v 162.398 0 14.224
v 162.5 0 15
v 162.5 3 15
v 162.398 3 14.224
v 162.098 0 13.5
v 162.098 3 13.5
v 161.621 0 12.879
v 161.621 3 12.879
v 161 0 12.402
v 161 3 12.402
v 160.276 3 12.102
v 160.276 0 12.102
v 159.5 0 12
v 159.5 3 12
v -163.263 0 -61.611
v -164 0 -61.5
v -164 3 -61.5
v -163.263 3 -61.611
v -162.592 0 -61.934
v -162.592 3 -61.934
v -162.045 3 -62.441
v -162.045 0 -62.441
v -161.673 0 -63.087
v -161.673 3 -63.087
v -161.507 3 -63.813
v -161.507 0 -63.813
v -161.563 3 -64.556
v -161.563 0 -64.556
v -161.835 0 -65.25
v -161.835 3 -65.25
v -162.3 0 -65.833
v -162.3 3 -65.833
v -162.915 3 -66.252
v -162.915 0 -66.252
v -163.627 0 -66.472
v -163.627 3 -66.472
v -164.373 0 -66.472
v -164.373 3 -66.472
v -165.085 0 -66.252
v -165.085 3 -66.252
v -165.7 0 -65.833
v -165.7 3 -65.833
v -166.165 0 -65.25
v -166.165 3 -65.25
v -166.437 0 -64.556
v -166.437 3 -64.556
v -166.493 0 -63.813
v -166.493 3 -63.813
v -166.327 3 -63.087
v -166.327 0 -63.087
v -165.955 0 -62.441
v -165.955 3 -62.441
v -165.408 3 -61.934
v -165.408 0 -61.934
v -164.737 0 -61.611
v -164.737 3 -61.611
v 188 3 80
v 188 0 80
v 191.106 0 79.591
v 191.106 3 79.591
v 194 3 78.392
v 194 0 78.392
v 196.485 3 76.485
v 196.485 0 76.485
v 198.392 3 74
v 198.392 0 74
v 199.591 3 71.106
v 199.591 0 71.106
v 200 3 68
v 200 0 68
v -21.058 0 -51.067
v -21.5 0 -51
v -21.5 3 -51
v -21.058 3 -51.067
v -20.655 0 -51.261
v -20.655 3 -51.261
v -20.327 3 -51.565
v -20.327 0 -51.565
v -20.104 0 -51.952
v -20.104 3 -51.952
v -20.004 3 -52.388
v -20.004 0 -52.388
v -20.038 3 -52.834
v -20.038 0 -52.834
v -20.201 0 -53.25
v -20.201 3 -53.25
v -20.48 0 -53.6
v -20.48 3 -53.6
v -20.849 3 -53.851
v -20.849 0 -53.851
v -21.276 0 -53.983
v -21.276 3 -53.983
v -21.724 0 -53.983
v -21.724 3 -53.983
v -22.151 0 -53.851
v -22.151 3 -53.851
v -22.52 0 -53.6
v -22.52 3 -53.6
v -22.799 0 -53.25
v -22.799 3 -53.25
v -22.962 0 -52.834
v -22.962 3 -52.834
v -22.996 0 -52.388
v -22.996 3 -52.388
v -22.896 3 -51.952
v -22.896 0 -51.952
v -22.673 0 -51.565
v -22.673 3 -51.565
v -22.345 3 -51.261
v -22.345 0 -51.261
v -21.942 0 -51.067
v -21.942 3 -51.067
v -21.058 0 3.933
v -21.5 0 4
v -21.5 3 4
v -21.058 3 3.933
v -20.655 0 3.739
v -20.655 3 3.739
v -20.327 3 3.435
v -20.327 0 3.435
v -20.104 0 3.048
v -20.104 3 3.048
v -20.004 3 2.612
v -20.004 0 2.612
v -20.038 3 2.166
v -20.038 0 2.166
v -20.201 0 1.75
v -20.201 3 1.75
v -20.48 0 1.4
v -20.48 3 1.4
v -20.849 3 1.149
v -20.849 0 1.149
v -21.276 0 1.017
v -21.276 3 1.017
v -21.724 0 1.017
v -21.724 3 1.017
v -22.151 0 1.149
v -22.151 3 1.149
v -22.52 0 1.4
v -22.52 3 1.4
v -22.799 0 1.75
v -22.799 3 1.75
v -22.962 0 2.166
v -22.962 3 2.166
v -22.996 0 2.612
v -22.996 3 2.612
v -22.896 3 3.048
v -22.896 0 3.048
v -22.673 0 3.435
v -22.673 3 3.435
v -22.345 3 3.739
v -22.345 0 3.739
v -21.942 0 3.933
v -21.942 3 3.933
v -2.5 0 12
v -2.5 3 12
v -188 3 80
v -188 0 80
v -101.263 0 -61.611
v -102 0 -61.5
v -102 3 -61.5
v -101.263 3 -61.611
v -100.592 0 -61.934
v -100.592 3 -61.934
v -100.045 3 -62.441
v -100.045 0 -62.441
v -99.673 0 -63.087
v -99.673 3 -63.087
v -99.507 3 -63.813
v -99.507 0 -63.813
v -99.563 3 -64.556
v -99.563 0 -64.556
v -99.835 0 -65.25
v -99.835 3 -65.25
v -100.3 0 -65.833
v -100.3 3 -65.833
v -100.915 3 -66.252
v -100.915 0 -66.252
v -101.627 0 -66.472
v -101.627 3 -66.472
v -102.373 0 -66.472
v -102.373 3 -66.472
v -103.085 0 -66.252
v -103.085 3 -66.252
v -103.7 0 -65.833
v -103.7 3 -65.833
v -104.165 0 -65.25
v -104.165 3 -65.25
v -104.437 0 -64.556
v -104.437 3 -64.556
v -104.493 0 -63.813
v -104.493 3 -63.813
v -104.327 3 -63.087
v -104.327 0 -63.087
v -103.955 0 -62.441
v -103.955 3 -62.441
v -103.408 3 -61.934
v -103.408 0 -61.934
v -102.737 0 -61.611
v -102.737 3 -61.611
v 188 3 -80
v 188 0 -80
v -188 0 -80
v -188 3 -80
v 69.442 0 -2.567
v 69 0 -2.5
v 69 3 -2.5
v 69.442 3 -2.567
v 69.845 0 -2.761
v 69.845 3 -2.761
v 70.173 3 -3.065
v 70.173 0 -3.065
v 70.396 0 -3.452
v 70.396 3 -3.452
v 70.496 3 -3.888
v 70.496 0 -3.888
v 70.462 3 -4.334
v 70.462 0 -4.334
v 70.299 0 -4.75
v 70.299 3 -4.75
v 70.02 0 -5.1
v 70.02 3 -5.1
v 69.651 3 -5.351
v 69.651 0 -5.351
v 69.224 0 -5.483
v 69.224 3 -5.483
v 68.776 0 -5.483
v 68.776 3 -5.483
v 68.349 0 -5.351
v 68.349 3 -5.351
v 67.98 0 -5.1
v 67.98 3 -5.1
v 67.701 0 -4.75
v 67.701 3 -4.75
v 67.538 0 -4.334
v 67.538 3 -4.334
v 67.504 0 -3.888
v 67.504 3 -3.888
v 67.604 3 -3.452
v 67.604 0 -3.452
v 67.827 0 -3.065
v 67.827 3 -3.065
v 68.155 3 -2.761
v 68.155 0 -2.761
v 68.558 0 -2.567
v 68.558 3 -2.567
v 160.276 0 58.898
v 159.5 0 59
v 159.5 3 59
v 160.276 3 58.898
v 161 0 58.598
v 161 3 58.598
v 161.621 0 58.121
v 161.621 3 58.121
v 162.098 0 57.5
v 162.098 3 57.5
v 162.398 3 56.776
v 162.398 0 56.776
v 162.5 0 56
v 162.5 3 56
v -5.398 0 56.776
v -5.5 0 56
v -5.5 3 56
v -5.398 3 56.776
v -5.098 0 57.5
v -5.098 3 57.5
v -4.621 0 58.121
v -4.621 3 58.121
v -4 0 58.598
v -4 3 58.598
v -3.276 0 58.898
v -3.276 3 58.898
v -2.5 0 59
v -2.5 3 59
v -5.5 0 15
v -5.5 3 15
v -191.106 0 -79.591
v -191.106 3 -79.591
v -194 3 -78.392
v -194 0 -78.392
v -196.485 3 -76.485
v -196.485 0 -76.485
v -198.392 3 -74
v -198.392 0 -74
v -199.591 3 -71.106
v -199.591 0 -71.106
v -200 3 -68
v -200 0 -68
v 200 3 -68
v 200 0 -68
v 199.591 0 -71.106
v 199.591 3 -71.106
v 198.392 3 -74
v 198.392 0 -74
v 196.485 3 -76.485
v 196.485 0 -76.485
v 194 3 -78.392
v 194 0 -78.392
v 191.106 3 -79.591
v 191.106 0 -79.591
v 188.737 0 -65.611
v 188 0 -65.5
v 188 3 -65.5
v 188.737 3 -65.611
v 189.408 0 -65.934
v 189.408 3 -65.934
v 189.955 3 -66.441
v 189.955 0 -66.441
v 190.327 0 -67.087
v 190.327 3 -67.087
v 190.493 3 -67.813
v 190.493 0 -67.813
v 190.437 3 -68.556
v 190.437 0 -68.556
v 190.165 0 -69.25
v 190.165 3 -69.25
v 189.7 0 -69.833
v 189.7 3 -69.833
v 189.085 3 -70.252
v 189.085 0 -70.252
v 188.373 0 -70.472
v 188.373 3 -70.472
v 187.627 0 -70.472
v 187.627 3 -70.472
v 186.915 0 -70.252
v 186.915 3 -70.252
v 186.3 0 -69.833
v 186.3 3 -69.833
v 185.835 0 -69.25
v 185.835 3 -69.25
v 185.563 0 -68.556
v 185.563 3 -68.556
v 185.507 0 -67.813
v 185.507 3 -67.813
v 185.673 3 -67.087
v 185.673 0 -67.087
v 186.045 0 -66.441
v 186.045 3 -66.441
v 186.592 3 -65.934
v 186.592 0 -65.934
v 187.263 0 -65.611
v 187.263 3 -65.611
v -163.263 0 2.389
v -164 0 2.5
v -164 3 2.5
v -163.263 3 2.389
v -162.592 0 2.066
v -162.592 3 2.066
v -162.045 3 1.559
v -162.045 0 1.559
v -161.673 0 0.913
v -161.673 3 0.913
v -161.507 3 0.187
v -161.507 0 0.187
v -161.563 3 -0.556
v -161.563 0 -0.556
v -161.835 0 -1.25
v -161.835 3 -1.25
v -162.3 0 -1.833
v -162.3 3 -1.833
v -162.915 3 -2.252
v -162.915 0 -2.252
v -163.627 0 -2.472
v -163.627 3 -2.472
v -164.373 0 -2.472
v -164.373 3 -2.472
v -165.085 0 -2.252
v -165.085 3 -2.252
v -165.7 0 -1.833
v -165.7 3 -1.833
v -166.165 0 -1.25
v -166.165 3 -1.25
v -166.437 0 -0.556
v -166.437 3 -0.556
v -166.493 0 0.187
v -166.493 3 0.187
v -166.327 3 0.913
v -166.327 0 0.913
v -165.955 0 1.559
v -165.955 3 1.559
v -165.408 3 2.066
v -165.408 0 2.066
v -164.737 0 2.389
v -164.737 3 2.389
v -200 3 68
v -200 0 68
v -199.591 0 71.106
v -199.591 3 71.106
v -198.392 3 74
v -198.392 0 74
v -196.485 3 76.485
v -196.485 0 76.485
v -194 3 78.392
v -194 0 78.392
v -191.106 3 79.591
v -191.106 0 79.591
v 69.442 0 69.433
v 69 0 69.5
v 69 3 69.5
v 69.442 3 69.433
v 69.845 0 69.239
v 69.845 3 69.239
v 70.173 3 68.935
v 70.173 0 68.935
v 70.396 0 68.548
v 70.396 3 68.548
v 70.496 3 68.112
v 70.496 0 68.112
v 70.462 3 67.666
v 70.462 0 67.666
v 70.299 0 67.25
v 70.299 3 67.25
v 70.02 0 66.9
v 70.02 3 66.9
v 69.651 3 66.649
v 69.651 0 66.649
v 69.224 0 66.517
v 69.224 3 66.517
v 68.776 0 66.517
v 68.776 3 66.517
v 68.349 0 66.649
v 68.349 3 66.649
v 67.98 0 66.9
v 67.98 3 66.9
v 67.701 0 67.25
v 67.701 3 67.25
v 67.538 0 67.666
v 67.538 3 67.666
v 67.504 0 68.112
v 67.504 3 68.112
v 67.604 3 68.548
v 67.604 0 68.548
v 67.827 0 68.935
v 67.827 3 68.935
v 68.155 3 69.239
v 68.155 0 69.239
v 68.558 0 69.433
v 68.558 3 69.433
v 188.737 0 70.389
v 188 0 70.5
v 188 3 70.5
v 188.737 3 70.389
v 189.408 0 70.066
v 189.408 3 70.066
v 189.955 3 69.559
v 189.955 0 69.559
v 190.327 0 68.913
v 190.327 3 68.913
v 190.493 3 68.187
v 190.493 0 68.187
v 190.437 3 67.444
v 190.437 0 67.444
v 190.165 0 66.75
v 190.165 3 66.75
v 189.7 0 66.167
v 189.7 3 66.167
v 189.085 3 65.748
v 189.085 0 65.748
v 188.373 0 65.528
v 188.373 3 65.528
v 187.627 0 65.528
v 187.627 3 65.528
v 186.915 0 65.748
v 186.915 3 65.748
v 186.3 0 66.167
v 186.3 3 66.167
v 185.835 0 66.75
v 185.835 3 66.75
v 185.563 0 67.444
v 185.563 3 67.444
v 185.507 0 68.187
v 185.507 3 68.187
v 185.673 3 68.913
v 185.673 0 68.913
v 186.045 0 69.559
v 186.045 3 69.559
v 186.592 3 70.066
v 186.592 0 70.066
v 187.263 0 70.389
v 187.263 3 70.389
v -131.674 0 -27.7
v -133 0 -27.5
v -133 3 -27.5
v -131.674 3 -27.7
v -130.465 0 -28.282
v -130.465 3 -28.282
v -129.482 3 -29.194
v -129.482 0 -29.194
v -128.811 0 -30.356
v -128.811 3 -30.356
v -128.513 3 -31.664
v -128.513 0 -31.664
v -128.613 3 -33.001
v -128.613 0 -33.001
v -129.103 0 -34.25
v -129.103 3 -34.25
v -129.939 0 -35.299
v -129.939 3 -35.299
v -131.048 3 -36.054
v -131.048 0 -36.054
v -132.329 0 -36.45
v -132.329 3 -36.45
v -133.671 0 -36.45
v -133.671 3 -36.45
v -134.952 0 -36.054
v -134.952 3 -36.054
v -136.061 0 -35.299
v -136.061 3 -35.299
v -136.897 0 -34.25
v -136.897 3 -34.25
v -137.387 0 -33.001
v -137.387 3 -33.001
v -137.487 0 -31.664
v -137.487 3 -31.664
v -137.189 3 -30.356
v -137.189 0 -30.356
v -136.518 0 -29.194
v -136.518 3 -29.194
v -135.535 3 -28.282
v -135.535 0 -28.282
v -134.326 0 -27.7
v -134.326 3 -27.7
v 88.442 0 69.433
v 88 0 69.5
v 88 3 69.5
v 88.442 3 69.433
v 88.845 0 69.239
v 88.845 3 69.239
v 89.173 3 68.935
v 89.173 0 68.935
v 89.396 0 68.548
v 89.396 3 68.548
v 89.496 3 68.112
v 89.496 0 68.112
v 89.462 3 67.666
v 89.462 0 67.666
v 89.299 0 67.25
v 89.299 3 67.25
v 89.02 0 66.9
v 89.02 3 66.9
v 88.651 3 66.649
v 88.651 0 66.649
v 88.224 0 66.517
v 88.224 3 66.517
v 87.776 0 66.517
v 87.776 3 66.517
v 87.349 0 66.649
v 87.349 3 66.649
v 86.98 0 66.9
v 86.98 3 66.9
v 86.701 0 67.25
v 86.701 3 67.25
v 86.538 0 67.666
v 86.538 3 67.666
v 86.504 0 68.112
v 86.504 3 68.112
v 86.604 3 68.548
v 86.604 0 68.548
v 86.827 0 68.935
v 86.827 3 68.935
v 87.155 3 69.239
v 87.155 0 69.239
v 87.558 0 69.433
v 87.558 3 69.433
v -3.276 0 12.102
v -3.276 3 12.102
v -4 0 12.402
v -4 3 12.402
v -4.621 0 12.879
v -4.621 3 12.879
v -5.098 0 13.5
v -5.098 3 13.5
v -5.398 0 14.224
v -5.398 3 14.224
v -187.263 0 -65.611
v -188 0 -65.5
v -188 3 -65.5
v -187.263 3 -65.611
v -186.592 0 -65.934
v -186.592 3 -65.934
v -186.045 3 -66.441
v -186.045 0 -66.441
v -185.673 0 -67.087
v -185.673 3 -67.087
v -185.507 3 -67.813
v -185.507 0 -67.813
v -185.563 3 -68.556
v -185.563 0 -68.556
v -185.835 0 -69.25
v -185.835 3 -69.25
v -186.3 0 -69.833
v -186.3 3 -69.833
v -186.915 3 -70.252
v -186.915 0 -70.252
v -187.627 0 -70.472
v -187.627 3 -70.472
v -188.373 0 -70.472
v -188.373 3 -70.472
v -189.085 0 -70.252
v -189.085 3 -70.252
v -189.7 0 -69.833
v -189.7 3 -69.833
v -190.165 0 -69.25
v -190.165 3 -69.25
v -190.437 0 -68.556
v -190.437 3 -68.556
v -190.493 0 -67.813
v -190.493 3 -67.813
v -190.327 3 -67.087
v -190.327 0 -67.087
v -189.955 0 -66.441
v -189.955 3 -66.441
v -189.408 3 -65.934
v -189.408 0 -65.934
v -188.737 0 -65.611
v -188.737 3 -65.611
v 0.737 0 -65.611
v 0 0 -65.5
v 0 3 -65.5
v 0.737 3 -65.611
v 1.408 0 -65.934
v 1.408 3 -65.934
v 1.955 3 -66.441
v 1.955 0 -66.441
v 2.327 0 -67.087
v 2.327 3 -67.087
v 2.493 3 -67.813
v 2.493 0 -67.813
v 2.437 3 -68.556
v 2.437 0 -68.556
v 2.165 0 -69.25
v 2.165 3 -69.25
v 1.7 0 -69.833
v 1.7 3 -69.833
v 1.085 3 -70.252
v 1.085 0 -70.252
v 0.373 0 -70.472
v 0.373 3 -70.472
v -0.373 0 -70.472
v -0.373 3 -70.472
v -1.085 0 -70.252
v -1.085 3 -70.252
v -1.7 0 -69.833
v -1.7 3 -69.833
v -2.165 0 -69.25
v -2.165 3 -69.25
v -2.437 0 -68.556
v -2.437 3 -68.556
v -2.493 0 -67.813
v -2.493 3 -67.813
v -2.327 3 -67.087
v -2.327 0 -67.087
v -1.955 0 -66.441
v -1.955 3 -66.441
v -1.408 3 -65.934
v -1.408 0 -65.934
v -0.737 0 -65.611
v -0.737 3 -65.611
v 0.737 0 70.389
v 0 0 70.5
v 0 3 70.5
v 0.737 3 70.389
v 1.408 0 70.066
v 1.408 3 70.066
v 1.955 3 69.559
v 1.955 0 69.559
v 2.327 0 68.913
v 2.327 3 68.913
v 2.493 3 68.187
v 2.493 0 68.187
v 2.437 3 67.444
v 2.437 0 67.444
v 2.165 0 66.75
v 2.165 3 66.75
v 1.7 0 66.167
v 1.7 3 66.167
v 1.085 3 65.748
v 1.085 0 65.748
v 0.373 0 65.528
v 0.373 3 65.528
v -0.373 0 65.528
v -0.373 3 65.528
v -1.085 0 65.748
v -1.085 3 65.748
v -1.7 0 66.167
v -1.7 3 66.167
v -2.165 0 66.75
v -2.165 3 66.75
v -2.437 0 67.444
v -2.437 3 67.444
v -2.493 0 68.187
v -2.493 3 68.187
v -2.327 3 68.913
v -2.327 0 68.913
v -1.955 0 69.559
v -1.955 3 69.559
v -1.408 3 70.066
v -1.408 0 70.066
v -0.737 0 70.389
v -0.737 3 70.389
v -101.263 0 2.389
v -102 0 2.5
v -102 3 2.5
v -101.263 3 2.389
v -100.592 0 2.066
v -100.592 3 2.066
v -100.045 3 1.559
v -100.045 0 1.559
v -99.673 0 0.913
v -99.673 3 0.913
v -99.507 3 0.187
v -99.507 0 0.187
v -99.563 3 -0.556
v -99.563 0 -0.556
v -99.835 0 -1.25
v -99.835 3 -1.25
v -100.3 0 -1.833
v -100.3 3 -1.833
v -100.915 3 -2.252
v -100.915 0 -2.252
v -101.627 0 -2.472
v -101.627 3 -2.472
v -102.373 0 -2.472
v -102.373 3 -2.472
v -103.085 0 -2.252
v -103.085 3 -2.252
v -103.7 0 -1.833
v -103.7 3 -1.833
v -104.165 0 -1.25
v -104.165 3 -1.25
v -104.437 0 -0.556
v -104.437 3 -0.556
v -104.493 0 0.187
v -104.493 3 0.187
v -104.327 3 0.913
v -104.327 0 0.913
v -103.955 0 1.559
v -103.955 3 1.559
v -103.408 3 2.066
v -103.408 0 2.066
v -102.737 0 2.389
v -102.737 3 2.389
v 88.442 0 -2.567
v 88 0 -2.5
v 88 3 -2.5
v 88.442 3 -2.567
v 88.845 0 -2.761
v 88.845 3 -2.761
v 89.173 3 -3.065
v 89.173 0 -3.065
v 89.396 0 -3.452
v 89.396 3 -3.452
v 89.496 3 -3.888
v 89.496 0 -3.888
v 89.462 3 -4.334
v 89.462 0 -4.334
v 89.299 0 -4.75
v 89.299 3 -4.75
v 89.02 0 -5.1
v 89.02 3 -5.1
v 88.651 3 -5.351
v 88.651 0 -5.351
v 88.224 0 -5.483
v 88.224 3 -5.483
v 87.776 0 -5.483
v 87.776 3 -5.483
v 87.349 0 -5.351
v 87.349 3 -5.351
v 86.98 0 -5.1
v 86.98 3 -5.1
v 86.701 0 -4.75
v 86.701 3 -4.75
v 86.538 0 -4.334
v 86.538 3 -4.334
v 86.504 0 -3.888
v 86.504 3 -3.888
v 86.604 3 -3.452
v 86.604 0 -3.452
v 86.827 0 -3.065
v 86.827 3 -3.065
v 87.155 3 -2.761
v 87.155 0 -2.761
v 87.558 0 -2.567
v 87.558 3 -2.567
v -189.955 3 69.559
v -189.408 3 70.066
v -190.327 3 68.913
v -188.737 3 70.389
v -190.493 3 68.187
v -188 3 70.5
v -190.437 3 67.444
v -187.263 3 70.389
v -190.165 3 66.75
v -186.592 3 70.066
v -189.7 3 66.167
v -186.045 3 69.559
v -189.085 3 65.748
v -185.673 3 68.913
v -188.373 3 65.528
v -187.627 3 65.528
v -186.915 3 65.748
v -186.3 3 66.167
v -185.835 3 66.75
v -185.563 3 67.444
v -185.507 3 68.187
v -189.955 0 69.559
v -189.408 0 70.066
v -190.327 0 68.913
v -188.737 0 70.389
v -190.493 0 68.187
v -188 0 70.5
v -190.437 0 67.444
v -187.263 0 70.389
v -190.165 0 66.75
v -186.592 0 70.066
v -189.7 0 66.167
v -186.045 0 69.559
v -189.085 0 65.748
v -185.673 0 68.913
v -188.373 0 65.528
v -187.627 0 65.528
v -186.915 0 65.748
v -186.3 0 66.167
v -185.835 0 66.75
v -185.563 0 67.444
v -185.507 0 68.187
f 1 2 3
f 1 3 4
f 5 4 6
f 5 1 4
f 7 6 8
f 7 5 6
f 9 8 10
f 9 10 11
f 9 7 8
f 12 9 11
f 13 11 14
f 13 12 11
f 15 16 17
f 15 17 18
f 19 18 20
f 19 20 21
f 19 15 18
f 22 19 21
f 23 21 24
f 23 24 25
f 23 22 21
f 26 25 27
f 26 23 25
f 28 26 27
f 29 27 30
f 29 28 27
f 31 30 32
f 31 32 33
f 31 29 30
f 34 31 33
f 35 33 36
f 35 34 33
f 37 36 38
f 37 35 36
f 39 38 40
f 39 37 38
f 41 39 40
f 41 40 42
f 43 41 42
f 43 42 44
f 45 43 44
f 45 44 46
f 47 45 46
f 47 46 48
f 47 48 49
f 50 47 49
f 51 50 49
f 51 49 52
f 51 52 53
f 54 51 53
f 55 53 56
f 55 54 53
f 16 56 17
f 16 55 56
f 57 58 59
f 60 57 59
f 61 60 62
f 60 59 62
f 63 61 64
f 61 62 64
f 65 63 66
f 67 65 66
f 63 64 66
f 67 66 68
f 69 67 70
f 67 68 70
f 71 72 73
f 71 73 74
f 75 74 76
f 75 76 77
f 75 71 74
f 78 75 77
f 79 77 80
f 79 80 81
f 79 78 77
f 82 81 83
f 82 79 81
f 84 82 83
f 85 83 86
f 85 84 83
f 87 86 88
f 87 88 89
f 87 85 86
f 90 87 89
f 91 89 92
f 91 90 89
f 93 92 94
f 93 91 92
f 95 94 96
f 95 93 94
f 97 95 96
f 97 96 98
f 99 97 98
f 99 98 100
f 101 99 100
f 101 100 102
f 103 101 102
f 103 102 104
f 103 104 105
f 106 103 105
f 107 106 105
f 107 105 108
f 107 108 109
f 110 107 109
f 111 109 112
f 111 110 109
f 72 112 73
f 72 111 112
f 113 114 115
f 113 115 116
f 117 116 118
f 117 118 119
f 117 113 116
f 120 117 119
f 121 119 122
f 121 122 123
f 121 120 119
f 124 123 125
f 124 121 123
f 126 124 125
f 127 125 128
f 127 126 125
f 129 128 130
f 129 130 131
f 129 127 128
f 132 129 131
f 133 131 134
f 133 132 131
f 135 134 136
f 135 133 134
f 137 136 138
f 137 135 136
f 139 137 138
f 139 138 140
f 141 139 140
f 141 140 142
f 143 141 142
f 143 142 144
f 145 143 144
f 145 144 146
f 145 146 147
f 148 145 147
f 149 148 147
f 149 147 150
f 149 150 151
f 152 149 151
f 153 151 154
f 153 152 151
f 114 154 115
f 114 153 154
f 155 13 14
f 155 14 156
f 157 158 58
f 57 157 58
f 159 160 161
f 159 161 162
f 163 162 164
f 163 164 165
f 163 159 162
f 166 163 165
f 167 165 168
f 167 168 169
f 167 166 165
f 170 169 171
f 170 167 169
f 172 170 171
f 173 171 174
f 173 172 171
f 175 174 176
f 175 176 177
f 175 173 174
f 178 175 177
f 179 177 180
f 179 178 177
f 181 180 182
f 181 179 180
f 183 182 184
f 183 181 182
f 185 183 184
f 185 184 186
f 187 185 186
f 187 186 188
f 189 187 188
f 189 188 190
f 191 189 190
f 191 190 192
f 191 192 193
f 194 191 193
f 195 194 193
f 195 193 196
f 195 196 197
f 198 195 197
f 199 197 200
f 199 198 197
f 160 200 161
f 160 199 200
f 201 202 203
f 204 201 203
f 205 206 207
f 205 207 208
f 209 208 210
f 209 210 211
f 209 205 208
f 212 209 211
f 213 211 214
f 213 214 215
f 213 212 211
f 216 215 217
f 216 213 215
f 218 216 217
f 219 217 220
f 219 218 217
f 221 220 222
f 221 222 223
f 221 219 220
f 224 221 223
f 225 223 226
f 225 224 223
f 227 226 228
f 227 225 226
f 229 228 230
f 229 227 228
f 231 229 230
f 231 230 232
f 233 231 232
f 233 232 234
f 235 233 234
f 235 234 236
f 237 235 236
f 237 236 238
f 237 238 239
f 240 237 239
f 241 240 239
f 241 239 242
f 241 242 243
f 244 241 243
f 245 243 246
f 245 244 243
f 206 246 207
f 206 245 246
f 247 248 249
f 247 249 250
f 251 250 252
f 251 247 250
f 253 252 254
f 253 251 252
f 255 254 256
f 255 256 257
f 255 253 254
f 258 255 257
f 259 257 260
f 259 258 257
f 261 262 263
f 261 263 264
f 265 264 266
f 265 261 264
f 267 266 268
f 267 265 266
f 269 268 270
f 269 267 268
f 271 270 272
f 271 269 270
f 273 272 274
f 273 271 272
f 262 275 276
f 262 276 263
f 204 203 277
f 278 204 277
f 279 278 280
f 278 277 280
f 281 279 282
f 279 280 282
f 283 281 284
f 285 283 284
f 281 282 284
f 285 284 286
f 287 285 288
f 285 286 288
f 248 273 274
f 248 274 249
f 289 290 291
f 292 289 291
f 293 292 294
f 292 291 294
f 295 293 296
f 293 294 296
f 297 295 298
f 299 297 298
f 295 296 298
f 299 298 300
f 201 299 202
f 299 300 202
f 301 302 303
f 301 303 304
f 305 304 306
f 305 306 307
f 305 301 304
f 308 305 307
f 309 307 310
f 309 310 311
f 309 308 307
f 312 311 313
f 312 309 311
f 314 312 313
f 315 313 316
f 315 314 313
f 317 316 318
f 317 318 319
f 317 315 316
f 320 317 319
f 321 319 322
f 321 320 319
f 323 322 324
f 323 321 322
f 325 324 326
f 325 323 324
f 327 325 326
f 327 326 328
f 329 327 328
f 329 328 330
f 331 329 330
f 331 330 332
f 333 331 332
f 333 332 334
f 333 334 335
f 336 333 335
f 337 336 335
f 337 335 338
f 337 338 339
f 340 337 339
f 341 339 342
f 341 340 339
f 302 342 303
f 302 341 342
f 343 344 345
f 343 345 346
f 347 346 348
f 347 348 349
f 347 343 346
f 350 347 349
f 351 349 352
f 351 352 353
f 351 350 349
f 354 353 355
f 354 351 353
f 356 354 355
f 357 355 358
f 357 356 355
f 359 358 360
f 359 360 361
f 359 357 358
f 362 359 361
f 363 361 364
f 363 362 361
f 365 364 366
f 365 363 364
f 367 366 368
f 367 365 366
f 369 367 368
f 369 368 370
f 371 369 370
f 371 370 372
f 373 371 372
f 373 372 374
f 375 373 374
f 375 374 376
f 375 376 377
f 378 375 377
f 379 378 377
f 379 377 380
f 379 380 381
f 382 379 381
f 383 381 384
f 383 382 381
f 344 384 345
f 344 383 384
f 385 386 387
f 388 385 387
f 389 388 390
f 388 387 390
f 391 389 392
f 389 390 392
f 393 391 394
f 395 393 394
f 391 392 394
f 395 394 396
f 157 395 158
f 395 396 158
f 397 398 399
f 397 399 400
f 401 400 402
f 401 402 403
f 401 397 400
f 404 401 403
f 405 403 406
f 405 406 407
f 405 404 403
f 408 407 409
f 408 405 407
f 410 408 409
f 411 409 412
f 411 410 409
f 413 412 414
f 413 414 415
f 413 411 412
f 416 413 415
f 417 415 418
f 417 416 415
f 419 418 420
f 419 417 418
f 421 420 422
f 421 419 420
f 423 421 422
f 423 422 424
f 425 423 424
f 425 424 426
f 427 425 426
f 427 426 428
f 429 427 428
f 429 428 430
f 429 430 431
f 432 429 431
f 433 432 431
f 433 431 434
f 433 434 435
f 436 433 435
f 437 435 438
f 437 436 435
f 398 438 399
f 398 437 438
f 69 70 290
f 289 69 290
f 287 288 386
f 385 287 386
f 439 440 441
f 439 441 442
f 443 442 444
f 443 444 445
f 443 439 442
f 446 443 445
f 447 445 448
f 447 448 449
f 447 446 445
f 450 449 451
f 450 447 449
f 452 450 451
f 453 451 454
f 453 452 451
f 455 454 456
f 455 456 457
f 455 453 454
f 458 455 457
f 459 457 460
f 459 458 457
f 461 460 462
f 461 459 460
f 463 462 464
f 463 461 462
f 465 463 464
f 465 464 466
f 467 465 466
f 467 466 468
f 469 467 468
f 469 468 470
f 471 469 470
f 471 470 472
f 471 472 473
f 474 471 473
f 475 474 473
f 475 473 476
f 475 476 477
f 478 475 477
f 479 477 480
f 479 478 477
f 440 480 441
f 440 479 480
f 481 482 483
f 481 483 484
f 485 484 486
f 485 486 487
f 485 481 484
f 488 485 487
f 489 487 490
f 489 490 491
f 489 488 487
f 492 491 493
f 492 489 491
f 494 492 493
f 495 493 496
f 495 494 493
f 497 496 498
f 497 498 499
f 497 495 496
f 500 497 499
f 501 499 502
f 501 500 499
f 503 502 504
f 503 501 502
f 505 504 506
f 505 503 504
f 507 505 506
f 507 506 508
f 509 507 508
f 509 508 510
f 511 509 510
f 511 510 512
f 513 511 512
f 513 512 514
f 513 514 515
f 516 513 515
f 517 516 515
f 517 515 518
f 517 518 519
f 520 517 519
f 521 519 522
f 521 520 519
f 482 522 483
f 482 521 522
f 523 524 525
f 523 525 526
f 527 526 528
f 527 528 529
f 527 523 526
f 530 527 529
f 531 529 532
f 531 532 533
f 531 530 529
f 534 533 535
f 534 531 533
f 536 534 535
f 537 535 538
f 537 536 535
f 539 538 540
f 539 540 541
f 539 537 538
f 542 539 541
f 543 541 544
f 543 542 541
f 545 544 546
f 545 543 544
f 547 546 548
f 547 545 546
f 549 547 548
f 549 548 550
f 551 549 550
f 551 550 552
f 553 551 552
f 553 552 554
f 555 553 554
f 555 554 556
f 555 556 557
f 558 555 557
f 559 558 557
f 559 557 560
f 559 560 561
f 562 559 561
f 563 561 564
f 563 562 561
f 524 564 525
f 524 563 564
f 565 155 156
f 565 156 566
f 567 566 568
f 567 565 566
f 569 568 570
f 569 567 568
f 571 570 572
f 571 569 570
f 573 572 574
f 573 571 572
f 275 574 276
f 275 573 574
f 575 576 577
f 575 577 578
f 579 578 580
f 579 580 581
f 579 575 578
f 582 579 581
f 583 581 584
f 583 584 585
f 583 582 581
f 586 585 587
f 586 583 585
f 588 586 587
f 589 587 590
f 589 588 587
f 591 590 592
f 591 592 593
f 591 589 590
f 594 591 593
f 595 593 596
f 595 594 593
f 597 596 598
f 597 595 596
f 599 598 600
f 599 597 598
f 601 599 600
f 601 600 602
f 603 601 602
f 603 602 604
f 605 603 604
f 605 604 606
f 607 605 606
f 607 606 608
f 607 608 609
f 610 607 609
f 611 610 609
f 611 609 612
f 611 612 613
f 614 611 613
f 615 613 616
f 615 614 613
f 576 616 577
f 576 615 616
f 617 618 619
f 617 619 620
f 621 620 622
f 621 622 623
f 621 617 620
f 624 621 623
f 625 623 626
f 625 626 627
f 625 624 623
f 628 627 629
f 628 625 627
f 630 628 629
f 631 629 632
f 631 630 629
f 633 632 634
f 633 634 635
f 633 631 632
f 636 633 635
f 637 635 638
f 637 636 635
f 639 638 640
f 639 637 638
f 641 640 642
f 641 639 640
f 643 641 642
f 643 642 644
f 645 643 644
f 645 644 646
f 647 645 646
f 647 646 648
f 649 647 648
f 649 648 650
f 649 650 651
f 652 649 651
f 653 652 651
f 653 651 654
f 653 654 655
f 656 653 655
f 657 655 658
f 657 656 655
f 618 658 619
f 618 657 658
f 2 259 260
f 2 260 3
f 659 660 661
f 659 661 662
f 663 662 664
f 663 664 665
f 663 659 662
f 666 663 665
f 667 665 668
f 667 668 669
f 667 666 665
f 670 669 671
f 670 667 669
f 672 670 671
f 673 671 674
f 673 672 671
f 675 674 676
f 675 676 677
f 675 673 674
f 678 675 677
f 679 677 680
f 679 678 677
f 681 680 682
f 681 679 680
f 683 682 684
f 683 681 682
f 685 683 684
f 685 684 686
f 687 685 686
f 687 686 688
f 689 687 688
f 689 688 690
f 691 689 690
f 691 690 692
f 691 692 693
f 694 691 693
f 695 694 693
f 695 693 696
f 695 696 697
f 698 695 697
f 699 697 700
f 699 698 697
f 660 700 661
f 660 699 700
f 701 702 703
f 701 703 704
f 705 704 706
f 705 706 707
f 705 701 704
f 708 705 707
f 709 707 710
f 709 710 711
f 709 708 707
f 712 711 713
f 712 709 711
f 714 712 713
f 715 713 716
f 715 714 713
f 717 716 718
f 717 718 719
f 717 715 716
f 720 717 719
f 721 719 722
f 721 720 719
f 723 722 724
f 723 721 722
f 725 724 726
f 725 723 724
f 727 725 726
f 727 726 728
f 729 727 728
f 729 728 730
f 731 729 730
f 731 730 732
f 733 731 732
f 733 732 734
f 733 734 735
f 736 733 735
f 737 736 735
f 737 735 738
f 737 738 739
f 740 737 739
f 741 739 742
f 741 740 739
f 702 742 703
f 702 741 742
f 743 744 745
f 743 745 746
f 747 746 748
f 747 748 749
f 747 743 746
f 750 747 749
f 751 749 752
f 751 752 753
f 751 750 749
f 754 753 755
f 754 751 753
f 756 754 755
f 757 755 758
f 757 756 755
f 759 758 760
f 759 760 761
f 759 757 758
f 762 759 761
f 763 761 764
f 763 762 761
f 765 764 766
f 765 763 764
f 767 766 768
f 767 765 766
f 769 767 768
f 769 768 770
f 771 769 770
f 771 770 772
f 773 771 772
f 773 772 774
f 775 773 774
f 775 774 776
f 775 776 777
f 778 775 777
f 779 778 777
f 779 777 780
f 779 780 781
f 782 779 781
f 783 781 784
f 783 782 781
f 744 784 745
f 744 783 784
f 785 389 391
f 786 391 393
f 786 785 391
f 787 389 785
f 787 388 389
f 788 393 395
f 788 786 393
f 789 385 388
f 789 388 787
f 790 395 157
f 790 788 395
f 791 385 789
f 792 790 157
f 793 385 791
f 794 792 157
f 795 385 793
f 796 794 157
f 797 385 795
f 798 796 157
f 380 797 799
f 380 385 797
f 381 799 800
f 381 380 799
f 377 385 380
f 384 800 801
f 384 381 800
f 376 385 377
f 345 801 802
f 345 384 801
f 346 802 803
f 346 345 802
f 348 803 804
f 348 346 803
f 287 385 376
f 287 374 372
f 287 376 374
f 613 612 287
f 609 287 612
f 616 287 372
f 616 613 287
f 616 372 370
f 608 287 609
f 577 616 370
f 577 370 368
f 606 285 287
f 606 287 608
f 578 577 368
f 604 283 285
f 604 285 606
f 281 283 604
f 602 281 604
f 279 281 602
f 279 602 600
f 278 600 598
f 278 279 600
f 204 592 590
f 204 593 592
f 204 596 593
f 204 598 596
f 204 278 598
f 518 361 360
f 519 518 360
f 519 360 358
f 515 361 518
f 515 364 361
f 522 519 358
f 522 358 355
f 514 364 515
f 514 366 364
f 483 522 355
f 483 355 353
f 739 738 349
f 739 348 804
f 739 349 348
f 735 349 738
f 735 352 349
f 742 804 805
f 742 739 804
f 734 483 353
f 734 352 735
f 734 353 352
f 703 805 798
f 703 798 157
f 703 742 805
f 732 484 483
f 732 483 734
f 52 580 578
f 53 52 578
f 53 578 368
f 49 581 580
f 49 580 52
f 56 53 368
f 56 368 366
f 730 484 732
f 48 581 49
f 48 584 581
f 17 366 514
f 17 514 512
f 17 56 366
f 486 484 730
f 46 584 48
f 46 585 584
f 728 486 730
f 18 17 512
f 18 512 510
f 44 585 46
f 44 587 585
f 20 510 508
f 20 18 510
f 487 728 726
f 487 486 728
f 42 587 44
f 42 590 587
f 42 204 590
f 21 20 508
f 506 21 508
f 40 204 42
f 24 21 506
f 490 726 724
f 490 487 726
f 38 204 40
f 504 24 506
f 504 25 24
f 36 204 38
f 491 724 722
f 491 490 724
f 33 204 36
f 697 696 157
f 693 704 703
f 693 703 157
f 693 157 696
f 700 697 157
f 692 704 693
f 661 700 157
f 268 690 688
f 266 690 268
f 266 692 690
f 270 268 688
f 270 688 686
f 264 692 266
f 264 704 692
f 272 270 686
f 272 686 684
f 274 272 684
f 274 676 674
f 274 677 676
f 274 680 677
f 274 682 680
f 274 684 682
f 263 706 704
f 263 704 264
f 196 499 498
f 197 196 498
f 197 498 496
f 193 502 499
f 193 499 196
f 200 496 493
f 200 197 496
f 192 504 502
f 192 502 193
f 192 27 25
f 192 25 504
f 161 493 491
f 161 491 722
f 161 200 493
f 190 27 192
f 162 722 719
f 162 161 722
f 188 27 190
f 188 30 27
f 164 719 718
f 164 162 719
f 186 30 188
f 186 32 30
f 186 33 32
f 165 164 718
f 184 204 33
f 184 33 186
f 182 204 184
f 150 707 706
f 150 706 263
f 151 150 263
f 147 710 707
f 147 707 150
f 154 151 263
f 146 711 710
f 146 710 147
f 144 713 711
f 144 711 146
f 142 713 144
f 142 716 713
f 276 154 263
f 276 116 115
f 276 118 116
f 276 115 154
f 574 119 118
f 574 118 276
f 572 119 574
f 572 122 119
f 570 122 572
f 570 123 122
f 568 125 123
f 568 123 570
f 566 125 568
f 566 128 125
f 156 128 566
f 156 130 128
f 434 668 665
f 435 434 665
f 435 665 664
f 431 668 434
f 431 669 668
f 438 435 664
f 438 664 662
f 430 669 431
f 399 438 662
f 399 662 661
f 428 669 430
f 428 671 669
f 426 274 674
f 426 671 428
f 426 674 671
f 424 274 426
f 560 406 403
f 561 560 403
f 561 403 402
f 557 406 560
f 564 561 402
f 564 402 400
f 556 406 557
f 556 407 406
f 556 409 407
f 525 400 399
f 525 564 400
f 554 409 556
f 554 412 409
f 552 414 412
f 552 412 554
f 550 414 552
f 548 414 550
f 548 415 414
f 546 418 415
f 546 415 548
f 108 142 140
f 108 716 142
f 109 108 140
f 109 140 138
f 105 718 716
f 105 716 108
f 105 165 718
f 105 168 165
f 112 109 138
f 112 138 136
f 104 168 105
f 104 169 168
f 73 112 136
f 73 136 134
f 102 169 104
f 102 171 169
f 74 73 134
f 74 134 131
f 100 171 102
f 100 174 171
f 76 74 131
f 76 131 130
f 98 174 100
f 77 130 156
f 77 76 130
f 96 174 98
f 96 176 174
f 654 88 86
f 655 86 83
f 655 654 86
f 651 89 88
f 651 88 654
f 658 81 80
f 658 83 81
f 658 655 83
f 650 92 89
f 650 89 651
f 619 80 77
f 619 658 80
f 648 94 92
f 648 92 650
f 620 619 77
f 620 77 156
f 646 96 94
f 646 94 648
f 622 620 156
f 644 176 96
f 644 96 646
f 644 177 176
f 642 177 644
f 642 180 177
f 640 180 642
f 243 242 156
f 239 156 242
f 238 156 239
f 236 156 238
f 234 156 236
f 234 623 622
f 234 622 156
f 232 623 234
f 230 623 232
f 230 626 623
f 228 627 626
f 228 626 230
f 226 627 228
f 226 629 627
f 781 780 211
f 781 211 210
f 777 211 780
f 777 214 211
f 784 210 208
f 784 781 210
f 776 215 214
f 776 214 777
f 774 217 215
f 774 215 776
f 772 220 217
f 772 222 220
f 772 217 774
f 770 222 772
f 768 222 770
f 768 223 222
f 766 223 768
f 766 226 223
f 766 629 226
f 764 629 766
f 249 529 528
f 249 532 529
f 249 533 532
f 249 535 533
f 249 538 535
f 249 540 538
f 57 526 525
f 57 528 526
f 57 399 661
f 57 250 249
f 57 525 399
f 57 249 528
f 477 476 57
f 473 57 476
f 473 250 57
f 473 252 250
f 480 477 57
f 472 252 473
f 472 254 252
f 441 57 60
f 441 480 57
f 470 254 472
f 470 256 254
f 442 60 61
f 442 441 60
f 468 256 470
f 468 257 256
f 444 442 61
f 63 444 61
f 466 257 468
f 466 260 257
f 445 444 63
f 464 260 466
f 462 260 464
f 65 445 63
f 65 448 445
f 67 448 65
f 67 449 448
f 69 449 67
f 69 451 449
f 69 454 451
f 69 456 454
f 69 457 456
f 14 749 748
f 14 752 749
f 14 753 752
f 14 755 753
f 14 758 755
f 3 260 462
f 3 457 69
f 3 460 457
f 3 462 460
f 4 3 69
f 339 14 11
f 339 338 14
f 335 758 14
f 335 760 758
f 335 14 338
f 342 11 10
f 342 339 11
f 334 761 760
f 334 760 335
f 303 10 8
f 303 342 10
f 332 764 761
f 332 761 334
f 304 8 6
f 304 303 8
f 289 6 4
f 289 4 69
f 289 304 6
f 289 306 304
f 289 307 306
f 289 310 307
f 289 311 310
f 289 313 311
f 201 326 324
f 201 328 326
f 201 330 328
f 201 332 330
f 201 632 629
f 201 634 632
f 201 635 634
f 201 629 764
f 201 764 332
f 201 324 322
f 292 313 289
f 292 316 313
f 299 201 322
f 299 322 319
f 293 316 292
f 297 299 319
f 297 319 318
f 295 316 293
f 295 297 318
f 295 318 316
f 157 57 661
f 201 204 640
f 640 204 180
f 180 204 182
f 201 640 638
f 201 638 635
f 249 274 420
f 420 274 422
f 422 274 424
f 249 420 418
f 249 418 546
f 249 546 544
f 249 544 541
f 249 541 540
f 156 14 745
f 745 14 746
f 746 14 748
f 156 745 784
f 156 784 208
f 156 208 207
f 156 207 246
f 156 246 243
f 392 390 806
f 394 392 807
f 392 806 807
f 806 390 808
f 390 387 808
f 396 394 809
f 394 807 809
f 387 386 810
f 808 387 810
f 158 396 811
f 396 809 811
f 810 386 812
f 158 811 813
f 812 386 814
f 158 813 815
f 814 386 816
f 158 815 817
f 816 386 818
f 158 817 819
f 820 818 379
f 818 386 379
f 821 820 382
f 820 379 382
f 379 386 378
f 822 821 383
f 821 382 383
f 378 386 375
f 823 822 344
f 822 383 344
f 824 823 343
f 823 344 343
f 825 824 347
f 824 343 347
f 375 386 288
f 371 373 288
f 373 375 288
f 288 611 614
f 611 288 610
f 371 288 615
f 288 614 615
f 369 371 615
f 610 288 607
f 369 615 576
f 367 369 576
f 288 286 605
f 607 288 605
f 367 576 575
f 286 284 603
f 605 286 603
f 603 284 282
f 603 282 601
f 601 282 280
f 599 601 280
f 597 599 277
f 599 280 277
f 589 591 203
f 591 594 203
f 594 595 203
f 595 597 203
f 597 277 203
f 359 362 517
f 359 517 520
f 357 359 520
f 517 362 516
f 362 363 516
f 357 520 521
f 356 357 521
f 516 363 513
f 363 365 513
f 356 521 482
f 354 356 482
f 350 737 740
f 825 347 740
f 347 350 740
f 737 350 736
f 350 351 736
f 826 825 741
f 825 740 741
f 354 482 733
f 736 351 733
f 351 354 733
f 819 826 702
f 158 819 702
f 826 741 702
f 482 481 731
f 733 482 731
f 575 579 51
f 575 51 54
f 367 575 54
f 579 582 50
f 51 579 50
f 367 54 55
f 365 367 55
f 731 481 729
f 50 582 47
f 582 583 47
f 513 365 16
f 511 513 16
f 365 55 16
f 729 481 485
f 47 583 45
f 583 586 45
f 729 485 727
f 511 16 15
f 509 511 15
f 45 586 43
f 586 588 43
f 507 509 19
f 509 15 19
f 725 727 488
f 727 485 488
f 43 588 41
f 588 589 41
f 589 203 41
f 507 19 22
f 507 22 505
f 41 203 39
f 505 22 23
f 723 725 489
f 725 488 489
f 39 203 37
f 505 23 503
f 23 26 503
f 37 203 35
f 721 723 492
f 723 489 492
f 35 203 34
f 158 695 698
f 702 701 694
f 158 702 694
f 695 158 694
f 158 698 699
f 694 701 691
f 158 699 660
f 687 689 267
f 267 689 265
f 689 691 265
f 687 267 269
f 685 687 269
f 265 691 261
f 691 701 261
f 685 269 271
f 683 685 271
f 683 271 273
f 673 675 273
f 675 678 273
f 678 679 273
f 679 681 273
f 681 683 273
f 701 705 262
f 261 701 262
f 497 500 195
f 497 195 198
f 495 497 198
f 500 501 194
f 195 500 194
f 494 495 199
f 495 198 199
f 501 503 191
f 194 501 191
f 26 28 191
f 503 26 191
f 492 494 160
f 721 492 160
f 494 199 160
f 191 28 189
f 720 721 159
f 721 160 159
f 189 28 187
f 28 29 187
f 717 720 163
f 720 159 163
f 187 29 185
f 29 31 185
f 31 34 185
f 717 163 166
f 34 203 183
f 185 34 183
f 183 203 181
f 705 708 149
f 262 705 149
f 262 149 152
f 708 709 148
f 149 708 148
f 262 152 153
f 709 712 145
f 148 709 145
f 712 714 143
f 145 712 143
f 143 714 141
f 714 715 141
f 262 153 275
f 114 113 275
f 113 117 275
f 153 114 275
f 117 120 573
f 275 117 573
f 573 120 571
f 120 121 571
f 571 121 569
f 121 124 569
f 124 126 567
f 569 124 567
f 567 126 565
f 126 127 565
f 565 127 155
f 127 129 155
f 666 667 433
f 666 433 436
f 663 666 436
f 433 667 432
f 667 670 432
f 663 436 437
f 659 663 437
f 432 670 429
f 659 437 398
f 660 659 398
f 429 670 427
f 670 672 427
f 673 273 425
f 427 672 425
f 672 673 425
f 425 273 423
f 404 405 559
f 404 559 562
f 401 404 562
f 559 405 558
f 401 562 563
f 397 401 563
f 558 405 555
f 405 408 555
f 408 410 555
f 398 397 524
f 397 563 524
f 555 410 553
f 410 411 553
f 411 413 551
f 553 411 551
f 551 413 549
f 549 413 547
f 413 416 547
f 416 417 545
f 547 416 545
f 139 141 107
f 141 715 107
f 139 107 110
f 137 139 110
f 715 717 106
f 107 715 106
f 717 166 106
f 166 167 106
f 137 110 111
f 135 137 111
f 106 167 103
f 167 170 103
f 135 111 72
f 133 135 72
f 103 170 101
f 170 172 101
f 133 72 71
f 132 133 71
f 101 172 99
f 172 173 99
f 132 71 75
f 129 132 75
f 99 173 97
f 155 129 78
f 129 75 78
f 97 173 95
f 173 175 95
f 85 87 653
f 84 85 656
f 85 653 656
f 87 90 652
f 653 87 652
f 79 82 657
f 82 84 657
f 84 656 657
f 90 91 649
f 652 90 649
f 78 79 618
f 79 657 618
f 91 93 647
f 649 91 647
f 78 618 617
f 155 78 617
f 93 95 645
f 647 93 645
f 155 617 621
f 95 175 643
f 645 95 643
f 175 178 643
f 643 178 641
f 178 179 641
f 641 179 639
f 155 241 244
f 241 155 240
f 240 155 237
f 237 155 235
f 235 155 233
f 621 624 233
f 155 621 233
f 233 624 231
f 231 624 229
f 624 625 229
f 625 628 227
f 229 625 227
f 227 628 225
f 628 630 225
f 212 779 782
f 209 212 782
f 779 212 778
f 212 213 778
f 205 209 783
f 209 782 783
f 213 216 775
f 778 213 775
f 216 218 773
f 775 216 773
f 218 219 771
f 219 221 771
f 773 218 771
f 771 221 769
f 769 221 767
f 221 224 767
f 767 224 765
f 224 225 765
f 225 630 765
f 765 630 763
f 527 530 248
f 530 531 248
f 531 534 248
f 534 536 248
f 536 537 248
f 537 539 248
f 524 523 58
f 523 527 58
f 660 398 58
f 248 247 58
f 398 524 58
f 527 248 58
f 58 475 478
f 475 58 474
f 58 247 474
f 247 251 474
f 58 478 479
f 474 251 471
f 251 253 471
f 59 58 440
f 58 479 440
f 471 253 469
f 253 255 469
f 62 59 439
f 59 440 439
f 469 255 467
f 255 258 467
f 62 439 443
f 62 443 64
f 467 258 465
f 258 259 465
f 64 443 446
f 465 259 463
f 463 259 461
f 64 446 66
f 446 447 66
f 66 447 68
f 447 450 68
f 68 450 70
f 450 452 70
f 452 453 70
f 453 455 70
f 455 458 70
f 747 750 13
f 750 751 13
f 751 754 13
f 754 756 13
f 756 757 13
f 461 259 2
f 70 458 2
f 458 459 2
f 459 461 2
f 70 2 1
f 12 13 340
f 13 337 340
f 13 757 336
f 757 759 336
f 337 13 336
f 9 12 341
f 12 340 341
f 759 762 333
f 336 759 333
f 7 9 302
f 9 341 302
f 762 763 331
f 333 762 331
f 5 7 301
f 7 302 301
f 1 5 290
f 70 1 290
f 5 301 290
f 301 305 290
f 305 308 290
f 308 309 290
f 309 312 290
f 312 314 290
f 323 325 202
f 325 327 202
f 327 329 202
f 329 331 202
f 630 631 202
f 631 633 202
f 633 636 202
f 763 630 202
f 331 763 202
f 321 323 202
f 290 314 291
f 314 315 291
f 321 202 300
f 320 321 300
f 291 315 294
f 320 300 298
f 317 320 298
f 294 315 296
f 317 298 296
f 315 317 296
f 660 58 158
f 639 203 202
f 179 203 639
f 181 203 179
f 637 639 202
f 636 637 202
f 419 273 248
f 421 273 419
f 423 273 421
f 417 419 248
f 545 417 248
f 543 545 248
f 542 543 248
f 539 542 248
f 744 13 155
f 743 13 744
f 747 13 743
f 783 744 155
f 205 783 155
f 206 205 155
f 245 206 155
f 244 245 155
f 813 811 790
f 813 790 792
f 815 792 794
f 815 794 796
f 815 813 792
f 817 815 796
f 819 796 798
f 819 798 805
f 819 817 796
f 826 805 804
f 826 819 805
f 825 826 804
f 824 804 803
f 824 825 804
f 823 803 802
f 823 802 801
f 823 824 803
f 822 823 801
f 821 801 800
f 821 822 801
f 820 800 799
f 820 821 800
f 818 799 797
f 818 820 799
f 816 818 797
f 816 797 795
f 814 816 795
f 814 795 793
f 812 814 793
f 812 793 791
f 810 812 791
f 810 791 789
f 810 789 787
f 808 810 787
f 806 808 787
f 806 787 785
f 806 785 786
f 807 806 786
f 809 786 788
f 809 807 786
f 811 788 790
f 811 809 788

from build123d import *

# Parameters (mm, degrees)
SKETCH1_R           = 2.5
SKETCH1_R_2         = 1.5
SKETCH1_R_3         = 4.5
BOSS_EXTRUDE1_DEPTH = 3


with BuildPart() as part:
    # Sketch1 → Boss-Extrude1 (new body)
    with BuildSketch(Plane(origin=(0, 0, 0), x_dir=(1, 0, 0), z_dir=(0, 1, 0))):
        with BuildLine():
            Line((-188, -80), (188, -80))
            ThreePointArc((188, -80), (196.485281374, -76.485281374), (200, -68))
            Line((200, -68), (200, 68))
            ThreePointArc((200, 68), (196.485281374, 76.485281374), (188, 80))
            Line((188, 80), (-188, 80))
            ThreePointArc((-188, 80), (-196.485281374, 76.485281374), (-200, 68))
            Line((-200, 68), (-200, -68))
            ThreePointArc((-200, -68), (-196.485281374, -76.485281374), (-188, -80))
        make_face()
        with Locations(Location((-188, 68, 0), (0, 0, 270))):
            Circle(SKETCH1_R, mode=Mode.SUBTRACT)
        with Locations(Location((0, 68, 0), (0, 0, 270))):
            Circle(SKETCH1_R, mode=Mode.SUBTRACT)
        with Locations(Location((188, 68, 0), (0, 0, 270))):
            Circle(SKETCH1_R, mode=Mode.SUBTRACT)
        with Locations(Location((188, -68, 0), (0, 0, 270))):
            Circle(SKETCH1_R, mode=Mode.SUBTRACT)
        with Locations(Location((0, -68, 0), (0, 0, 270))):
            Circle(SKETCH1_R, mode=Mode.SUBTRACT)
        with Locations(Location((-188, -68, 0), (0, 0, 270))):
            Circle(SKETCH1_R, mode=Mode.SUBTRACT)
        with Locations(Location((-21.5, 52.5, 0), (0, 0, 270))):
            Circle(SKETCH1_R_2, mode=Mode.SUBTRACT)
        with Locations(Location((-21.5, -2.5, 0), (0, 0, 270))):
            Circle(SKETCH1_R_2, mode=Mode.SUBTRACT)
        with Locations(Location((69, 4, 0), (0, 0, 270))):
            Circle(SKETCH1_R_2, mode=Mode.SUBTRACT)
        with Locations(Location((88, 4, 0), (0, 0, 270))):
            Circle(SKETCH1_R_2, mode=Mode.SUBTRACT)
        with Locations(Location((69, -68, 0), (0, 0, 270))):
            Circle(SKETCH1_R_2, mode=Mode.SUBTRACT)
        with Locations(Location((88, -68, 0), (0, 0, 270))):
            Circle(SKETCH1_R_2, mode=Mode.SUBTRACT)
        with Locations(Location((-133, 32, 0), (0, 0, 270))):
            Circle(SKETCH1_R_3, mode=Mode.SUBTRACT)
        with Locations(Location((-164, 64, 0), (0, 0, 270))):
            Circle(SKETCH1_R, mode=Mode.SUBTRACT)
        with Locations(Location((-102, 64, 0), (0, 0, 270))):
            Circle(SKETCH1_R, mode=Mode.SUBTRACT)
        with Locations(Location((-102, 0, 0), (0, 0, 270))):
            Circle(SKETCH1_R, mode=Mode.SUBTRACT)
        with Locations(Location((-164, 0, 0), (0, 0, 270))):
            Circle(SKETCH1_R, mode=Mode.SUBTRACT)
        with BuildLine():
            Line((-2.5, -59), (159.5, -59))
            ThreePointArc((159.5, -59), (161.621320344, -58.121320344), (162.5, -56))
            Line((162.5, -56), (162.5, -15))
            ThreePointArc((162.5, -15), (161.621320344, -12.878679656), (159.5, -12))
            Line((159.5, -12), (-2.5, -12))
            ThreePointArc((-2.5, -12), (-4.621320344, -12.878679656), (-5.5, -15))
            Line((-5.5, -15), (-5.5, -56))
            ThreePointArc((-5.5, -56), (-4.621320344, -58.121320344), (-2.5, -59))
        make_face(mode=Mode.SUBTRACT)
    extrude(amount=BOSS_EXTRUDE1_DEPTH)


solid = part.part
